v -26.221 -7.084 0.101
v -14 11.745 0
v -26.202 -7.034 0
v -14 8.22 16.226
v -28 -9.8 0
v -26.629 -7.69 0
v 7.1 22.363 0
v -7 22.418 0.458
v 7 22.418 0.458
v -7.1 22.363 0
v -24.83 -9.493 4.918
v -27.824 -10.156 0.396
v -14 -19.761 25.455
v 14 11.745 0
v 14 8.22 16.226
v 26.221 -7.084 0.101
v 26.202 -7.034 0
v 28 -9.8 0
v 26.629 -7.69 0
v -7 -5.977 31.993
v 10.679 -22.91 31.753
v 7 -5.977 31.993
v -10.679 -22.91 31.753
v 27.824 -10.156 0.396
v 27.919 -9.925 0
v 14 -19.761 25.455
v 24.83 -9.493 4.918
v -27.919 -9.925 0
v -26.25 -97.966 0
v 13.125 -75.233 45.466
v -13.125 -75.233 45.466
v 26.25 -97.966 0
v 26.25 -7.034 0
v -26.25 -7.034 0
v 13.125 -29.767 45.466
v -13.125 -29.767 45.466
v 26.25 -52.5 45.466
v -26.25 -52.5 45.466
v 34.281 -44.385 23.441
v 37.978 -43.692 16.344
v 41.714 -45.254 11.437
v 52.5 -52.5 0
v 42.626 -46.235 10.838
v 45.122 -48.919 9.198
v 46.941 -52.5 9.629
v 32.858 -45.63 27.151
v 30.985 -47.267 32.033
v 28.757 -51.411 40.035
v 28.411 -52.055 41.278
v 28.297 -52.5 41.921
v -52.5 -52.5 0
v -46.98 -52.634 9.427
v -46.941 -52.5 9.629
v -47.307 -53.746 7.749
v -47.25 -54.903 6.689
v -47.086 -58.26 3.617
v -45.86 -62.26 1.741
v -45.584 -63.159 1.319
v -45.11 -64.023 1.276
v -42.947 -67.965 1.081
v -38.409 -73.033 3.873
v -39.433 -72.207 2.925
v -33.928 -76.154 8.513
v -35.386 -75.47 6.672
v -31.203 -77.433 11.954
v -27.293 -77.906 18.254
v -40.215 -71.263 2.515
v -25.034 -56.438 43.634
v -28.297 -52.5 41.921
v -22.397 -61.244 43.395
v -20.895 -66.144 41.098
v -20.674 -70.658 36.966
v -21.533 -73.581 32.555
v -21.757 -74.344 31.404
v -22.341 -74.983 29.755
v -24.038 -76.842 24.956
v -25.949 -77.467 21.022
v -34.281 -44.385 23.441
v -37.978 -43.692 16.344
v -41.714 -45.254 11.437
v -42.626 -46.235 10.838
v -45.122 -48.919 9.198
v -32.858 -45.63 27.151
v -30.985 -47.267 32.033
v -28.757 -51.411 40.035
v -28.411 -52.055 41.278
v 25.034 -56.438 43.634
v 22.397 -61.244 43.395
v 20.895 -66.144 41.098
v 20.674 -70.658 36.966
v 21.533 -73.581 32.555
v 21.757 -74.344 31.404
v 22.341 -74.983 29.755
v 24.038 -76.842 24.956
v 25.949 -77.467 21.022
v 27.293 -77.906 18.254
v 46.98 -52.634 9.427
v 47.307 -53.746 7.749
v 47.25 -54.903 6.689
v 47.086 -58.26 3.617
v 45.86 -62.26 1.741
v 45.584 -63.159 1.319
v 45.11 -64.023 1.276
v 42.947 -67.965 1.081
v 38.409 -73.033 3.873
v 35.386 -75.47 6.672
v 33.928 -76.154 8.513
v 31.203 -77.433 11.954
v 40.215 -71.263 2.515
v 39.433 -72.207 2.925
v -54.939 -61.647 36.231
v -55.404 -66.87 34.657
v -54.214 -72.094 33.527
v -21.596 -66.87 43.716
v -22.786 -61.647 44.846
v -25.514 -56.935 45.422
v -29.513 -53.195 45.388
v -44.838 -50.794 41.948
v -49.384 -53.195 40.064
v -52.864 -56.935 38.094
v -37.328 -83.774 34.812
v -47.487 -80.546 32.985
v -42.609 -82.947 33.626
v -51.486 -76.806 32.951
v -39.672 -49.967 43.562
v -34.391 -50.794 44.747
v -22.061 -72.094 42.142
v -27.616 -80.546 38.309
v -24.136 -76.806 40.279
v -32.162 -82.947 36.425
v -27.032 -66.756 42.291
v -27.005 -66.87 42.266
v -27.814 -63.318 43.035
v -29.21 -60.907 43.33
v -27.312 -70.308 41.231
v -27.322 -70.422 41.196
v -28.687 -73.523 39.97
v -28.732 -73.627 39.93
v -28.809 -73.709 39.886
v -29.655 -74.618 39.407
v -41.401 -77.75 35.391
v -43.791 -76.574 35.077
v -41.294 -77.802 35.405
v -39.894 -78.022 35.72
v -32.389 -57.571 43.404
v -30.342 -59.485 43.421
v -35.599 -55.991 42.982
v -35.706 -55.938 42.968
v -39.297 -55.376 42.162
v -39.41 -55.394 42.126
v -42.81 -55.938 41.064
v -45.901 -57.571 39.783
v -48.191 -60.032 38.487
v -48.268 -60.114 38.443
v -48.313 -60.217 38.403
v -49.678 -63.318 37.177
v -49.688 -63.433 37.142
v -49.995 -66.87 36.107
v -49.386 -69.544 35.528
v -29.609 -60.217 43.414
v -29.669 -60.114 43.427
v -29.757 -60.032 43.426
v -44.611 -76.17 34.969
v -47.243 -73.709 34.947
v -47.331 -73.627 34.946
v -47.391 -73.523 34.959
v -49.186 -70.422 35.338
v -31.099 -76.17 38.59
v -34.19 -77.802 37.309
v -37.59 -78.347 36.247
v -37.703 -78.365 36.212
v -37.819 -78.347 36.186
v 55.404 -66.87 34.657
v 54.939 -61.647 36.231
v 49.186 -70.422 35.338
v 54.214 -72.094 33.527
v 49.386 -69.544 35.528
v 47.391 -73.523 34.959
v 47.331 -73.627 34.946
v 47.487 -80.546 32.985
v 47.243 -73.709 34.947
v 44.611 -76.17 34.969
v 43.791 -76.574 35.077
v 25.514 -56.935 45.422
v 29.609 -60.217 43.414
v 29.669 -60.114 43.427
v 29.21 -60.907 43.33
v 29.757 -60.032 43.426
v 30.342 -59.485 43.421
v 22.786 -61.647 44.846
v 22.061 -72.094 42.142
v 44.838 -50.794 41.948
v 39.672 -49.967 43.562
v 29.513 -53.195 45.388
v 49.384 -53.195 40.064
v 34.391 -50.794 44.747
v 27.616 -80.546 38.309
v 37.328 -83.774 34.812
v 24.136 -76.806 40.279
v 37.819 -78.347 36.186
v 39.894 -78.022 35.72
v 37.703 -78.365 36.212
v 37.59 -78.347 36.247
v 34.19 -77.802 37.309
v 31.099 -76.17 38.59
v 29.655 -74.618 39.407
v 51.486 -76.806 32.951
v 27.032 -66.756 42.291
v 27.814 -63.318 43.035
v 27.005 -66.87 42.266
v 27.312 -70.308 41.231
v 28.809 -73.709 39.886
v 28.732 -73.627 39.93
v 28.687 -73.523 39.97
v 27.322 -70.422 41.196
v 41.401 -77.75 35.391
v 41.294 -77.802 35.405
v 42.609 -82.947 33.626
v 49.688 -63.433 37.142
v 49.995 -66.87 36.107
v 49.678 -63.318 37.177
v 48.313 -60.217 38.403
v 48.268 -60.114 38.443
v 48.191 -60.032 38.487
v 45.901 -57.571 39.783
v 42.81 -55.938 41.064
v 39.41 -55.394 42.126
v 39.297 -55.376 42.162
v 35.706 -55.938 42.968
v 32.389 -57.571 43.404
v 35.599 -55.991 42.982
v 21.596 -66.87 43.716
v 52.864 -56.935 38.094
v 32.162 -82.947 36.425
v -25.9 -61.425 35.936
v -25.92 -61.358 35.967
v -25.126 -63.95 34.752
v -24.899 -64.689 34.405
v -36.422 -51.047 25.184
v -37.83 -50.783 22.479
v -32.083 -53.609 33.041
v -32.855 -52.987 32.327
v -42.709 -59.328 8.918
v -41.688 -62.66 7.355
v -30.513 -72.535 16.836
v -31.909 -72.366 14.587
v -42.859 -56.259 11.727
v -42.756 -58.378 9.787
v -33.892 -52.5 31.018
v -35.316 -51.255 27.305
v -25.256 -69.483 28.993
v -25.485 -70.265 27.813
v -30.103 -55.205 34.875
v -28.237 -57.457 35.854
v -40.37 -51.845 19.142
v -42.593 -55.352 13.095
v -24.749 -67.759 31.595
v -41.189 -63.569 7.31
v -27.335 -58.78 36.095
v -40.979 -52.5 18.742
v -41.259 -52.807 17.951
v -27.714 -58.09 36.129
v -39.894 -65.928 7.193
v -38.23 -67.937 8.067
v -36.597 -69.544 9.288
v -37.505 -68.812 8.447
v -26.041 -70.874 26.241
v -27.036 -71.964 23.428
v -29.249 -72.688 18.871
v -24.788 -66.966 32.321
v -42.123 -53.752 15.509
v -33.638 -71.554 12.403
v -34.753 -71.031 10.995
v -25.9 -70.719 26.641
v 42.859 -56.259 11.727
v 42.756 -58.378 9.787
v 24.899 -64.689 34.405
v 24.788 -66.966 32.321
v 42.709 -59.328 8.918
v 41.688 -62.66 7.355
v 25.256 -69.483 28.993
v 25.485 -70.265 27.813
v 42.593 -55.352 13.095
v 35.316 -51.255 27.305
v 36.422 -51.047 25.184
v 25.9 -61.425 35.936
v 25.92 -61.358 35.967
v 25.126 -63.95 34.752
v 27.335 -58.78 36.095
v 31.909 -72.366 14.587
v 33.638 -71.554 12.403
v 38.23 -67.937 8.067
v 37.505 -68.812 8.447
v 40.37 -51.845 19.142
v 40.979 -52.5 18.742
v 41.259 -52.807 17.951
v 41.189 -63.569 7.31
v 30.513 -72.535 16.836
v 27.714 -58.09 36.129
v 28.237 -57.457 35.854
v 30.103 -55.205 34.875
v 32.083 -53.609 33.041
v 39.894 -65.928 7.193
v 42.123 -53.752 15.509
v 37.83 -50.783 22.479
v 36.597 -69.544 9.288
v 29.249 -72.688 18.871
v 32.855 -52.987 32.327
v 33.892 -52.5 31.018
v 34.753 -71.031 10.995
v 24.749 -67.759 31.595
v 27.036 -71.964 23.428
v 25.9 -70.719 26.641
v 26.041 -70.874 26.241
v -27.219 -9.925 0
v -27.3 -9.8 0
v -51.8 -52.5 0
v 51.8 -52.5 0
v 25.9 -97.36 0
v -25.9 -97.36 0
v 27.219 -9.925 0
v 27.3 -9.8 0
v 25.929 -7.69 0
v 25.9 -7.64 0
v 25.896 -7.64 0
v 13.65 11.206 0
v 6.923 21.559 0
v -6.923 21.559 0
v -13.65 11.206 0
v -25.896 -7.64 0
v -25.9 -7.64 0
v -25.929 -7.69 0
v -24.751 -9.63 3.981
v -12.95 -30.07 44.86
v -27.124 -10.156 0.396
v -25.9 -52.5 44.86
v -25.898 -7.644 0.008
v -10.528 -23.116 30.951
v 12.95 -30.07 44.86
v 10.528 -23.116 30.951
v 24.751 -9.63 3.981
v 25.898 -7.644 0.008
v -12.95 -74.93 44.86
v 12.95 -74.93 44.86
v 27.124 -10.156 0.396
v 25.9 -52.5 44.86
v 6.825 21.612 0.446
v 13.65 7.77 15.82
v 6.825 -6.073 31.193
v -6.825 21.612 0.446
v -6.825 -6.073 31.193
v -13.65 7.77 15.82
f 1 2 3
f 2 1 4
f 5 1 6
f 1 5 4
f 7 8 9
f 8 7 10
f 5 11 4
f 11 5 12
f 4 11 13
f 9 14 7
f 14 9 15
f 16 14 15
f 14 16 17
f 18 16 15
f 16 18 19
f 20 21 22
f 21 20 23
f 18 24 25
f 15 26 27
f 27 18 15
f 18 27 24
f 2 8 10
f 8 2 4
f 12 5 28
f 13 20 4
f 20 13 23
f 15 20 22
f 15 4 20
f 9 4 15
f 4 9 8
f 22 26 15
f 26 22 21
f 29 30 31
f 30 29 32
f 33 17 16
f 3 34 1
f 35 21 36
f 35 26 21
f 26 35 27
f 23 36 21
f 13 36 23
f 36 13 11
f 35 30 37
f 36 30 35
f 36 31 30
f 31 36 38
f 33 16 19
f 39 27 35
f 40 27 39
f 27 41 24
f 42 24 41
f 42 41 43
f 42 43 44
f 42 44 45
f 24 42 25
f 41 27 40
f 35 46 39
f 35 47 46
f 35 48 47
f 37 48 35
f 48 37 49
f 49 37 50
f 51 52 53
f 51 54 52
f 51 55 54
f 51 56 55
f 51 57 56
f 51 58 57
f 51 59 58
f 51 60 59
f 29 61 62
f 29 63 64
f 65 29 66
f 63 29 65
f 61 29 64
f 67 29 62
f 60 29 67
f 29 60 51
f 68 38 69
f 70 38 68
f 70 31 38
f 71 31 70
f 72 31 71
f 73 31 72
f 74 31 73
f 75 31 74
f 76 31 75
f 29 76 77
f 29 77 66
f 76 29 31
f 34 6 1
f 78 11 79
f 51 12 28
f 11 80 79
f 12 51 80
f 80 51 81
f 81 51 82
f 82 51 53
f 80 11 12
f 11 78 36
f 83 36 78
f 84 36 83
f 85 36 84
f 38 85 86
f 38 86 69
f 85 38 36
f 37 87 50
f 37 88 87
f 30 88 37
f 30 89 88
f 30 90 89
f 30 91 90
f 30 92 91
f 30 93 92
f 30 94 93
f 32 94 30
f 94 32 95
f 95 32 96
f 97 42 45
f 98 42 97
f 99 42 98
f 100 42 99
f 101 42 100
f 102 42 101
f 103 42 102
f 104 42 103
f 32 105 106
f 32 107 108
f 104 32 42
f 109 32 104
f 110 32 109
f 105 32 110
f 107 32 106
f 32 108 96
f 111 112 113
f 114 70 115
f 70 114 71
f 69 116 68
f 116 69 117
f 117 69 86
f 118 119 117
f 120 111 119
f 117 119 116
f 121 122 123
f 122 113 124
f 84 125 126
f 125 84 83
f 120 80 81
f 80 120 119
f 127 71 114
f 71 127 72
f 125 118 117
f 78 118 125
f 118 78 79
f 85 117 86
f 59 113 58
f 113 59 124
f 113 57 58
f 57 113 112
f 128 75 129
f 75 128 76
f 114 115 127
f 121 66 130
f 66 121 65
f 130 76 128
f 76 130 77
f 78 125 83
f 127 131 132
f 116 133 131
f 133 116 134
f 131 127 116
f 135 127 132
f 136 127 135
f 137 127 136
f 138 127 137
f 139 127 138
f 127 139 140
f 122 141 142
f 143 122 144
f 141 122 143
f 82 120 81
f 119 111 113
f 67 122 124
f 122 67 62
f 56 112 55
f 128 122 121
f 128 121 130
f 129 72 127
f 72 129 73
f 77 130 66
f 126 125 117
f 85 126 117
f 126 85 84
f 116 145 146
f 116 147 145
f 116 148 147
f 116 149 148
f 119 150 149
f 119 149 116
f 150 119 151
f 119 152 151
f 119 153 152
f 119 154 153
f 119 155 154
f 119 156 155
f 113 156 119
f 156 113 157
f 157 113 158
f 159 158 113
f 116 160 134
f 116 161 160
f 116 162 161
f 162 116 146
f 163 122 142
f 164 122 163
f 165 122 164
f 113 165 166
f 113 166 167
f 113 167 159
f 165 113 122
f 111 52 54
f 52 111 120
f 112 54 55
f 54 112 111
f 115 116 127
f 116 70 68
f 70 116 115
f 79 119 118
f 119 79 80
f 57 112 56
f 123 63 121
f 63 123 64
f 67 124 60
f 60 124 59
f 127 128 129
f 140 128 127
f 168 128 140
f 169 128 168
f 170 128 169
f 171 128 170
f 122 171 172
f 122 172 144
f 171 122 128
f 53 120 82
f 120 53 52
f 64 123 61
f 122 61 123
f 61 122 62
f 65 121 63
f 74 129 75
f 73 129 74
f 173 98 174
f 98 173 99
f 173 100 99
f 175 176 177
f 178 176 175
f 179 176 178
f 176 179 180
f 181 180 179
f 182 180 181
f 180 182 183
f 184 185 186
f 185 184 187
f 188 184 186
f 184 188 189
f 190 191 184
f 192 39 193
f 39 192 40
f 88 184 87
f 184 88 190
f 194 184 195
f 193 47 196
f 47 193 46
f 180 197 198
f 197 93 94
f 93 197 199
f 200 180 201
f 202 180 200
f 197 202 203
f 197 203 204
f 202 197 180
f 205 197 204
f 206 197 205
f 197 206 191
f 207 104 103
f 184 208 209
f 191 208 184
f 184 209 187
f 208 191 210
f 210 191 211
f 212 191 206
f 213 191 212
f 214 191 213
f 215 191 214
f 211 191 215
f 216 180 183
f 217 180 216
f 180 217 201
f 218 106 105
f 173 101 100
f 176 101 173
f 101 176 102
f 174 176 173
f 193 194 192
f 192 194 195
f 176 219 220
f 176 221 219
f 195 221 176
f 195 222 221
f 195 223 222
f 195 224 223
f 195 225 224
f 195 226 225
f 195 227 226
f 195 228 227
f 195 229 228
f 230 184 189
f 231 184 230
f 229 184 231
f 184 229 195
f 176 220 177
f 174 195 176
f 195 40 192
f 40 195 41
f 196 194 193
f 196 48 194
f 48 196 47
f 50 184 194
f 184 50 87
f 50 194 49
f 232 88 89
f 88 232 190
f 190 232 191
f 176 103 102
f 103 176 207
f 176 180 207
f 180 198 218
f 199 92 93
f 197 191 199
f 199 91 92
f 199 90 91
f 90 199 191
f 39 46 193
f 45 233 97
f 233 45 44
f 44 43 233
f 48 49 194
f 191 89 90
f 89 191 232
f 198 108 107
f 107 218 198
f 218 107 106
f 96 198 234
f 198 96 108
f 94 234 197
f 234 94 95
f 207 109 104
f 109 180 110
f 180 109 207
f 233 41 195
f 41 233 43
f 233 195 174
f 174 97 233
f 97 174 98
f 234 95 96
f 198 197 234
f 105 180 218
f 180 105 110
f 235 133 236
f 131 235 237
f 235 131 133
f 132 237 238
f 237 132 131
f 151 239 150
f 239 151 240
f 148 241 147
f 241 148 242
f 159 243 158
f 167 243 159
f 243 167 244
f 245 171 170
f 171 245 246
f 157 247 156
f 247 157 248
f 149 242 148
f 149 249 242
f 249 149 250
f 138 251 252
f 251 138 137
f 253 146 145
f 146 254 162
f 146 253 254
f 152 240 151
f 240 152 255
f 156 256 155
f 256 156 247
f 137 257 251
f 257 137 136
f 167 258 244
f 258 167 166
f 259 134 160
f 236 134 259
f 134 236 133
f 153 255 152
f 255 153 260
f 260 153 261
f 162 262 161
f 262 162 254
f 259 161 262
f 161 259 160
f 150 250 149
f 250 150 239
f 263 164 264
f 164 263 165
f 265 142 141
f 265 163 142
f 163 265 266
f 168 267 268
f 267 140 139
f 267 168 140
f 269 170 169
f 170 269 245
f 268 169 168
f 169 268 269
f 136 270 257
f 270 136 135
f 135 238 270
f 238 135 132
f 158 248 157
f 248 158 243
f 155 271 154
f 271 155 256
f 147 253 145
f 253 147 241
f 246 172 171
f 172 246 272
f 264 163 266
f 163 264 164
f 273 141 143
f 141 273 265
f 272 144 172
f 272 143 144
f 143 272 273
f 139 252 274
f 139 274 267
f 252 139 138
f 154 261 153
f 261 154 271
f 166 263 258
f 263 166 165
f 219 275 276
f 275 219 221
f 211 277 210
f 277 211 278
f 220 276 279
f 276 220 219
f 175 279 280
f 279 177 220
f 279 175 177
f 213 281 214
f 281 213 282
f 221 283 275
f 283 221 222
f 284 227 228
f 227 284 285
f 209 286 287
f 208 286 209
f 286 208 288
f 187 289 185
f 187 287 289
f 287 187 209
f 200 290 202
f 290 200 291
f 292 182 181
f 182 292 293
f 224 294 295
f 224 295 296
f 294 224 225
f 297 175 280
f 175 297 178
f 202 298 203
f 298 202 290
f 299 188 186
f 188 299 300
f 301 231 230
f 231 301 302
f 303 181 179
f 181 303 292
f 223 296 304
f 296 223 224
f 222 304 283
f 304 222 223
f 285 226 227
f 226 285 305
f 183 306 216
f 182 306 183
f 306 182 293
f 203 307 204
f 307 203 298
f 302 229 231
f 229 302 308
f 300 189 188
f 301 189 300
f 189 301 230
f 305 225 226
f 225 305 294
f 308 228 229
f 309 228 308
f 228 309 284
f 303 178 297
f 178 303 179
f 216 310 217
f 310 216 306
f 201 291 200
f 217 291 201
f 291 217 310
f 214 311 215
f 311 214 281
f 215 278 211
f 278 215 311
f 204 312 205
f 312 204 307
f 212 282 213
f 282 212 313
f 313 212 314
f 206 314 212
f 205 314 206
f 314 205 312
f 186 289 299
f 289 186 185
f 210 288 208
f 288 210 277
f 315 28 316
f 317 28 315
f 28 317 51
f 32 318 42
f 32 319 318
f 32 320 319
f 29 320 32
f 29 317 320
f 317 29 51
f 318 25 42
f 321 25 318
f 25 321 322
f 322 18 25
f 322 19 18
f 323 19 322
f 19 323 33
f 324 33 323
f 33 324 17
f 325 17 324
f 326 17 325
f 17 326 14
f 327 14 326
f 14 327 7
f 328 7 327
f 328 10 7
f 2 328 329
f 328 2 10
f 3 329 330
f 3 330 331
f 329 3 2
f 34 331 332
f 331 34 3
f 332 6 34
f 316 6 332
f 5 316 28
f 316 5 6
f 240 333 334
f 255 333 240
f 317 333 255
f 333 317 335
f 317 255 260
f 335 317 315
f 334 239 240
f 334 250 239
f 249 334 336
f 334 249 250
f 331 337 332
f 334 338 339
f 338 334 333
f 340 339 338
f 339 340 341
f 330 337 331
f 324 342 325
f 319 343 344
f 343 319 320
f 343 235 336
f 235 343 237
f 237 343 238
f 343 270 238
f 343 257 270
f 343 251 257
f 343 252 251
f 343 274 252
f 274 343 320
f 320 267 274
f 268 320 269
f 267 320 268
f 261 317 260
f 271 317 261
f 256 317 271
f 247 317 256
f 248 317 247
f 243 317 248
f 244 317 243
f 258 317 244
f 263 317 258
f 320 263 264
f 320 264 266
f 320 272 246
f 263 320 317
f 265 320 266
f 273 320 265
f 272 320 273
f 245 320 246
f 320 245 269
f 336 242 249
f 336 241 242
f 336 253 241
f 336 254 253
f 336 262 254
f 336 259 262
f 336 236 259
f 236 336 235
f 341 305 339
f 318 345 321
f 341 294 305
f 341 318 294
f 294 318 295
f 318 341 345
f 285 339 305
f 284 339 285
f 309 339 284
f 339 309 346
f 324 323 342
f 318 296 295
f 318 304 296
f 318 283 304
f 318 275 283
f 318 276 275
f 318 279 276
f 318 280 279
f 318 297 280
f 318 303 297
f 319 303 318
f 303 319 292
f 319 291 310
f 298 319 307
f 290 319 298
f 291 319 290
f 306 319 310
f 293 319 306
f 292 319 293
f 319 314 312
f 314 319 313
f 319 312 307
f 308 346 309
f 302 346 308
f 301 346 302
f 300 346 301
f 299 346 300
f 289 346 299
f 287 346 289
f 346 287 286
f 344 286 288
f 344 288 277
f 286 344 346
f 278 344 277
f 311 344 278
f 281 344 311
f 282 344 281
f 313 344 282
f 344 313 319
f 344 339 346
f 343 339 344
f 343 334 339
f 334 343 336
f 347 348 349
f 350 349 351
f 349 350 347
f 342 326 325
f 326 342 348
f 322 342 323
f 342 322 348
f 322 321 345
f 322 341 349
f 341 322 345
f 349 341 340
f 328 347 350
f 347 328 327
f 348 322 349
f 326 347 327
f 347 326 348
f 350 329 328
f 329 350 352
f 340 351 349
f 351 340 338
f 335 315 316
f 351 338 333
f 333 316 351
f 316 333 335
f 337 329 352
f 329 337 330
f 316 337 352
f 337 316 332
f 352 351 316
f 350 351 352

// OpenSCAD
difference() {
    union() {
        mask();
        translate([0,0,-10]) linear_extrude(10) projection(cut=true) translate([0,0,-.000001]) mask();
    }
    translate([0,25,-12]) scale([.85,1,1]) sphere(d=21);
    
    translate([-50,-30,-4]) rotate([0,90,0])
        color("red") {
            cylinder(d=5, h=100);
            translate([0,-45,0]) cylinder(d=5, h=100);
        }
}



module mask() {
    scale (1.4)
    difference() {
        $fn=6;
        union() {
            main_mask();
            tubes();
        }
        all_cutouts();
    }
}

module tubes() {
    difference() {
        union() {
            translate([-20,-40,0]) rotate([15,-15,0]) cylinder($fn=20, d=25, h=30);
            translate([20,-40,0]) rotate([15,15,0]) cylinder($fn=20, d=25, h=30);
        }
    }
}

module tubes_cutout() {
    translate([-20,-40,0]) rotate([15,-15,0]) cylinder($fn=20, d=25-8, h=31);
    translate([20,-40,0]) rotate([15,15,0]) cylinder($fn=20, d=25-8, h=31);
}

module all_cutouts() {
    tubes_cutout();
    mask_cutout();
}

module main_mask() {
    difference () {
        union() {
            translate([0,-7,0]) rotate([-48,0,0]) scale([1,1.75,1])
                hollow_sphere(40, hollow=1, thickness=2.1);
            translate([0,-37.5,0])
                hollow_sphere(hollow=1, thickness=2.1);
        }
        //translate([0,-37,0]) cylinder(d=37,h=100);
    }
}

module mask_cutout() {    
    translate([-200/2,-200/2,-200]) cube(200);
    translate([0,-37.5,0])
        hollow_sphere(diam=74, hollow=0);
    
    translate([0,-7,0]) rotate([-48,0,0]) scale([1,1.75,1])
        hollow_sphere(39, hollow=0);
}

module hollow_sphere(diam=75, thickness=1, half=0, hollow=0) {
    difference() {
        sphere(d=diam);
        if (hollow) sphere(d=diam-thickness);
        if (half) translate([-diam/2,-diam/2,-diam]) cube(diam);
    }
}
